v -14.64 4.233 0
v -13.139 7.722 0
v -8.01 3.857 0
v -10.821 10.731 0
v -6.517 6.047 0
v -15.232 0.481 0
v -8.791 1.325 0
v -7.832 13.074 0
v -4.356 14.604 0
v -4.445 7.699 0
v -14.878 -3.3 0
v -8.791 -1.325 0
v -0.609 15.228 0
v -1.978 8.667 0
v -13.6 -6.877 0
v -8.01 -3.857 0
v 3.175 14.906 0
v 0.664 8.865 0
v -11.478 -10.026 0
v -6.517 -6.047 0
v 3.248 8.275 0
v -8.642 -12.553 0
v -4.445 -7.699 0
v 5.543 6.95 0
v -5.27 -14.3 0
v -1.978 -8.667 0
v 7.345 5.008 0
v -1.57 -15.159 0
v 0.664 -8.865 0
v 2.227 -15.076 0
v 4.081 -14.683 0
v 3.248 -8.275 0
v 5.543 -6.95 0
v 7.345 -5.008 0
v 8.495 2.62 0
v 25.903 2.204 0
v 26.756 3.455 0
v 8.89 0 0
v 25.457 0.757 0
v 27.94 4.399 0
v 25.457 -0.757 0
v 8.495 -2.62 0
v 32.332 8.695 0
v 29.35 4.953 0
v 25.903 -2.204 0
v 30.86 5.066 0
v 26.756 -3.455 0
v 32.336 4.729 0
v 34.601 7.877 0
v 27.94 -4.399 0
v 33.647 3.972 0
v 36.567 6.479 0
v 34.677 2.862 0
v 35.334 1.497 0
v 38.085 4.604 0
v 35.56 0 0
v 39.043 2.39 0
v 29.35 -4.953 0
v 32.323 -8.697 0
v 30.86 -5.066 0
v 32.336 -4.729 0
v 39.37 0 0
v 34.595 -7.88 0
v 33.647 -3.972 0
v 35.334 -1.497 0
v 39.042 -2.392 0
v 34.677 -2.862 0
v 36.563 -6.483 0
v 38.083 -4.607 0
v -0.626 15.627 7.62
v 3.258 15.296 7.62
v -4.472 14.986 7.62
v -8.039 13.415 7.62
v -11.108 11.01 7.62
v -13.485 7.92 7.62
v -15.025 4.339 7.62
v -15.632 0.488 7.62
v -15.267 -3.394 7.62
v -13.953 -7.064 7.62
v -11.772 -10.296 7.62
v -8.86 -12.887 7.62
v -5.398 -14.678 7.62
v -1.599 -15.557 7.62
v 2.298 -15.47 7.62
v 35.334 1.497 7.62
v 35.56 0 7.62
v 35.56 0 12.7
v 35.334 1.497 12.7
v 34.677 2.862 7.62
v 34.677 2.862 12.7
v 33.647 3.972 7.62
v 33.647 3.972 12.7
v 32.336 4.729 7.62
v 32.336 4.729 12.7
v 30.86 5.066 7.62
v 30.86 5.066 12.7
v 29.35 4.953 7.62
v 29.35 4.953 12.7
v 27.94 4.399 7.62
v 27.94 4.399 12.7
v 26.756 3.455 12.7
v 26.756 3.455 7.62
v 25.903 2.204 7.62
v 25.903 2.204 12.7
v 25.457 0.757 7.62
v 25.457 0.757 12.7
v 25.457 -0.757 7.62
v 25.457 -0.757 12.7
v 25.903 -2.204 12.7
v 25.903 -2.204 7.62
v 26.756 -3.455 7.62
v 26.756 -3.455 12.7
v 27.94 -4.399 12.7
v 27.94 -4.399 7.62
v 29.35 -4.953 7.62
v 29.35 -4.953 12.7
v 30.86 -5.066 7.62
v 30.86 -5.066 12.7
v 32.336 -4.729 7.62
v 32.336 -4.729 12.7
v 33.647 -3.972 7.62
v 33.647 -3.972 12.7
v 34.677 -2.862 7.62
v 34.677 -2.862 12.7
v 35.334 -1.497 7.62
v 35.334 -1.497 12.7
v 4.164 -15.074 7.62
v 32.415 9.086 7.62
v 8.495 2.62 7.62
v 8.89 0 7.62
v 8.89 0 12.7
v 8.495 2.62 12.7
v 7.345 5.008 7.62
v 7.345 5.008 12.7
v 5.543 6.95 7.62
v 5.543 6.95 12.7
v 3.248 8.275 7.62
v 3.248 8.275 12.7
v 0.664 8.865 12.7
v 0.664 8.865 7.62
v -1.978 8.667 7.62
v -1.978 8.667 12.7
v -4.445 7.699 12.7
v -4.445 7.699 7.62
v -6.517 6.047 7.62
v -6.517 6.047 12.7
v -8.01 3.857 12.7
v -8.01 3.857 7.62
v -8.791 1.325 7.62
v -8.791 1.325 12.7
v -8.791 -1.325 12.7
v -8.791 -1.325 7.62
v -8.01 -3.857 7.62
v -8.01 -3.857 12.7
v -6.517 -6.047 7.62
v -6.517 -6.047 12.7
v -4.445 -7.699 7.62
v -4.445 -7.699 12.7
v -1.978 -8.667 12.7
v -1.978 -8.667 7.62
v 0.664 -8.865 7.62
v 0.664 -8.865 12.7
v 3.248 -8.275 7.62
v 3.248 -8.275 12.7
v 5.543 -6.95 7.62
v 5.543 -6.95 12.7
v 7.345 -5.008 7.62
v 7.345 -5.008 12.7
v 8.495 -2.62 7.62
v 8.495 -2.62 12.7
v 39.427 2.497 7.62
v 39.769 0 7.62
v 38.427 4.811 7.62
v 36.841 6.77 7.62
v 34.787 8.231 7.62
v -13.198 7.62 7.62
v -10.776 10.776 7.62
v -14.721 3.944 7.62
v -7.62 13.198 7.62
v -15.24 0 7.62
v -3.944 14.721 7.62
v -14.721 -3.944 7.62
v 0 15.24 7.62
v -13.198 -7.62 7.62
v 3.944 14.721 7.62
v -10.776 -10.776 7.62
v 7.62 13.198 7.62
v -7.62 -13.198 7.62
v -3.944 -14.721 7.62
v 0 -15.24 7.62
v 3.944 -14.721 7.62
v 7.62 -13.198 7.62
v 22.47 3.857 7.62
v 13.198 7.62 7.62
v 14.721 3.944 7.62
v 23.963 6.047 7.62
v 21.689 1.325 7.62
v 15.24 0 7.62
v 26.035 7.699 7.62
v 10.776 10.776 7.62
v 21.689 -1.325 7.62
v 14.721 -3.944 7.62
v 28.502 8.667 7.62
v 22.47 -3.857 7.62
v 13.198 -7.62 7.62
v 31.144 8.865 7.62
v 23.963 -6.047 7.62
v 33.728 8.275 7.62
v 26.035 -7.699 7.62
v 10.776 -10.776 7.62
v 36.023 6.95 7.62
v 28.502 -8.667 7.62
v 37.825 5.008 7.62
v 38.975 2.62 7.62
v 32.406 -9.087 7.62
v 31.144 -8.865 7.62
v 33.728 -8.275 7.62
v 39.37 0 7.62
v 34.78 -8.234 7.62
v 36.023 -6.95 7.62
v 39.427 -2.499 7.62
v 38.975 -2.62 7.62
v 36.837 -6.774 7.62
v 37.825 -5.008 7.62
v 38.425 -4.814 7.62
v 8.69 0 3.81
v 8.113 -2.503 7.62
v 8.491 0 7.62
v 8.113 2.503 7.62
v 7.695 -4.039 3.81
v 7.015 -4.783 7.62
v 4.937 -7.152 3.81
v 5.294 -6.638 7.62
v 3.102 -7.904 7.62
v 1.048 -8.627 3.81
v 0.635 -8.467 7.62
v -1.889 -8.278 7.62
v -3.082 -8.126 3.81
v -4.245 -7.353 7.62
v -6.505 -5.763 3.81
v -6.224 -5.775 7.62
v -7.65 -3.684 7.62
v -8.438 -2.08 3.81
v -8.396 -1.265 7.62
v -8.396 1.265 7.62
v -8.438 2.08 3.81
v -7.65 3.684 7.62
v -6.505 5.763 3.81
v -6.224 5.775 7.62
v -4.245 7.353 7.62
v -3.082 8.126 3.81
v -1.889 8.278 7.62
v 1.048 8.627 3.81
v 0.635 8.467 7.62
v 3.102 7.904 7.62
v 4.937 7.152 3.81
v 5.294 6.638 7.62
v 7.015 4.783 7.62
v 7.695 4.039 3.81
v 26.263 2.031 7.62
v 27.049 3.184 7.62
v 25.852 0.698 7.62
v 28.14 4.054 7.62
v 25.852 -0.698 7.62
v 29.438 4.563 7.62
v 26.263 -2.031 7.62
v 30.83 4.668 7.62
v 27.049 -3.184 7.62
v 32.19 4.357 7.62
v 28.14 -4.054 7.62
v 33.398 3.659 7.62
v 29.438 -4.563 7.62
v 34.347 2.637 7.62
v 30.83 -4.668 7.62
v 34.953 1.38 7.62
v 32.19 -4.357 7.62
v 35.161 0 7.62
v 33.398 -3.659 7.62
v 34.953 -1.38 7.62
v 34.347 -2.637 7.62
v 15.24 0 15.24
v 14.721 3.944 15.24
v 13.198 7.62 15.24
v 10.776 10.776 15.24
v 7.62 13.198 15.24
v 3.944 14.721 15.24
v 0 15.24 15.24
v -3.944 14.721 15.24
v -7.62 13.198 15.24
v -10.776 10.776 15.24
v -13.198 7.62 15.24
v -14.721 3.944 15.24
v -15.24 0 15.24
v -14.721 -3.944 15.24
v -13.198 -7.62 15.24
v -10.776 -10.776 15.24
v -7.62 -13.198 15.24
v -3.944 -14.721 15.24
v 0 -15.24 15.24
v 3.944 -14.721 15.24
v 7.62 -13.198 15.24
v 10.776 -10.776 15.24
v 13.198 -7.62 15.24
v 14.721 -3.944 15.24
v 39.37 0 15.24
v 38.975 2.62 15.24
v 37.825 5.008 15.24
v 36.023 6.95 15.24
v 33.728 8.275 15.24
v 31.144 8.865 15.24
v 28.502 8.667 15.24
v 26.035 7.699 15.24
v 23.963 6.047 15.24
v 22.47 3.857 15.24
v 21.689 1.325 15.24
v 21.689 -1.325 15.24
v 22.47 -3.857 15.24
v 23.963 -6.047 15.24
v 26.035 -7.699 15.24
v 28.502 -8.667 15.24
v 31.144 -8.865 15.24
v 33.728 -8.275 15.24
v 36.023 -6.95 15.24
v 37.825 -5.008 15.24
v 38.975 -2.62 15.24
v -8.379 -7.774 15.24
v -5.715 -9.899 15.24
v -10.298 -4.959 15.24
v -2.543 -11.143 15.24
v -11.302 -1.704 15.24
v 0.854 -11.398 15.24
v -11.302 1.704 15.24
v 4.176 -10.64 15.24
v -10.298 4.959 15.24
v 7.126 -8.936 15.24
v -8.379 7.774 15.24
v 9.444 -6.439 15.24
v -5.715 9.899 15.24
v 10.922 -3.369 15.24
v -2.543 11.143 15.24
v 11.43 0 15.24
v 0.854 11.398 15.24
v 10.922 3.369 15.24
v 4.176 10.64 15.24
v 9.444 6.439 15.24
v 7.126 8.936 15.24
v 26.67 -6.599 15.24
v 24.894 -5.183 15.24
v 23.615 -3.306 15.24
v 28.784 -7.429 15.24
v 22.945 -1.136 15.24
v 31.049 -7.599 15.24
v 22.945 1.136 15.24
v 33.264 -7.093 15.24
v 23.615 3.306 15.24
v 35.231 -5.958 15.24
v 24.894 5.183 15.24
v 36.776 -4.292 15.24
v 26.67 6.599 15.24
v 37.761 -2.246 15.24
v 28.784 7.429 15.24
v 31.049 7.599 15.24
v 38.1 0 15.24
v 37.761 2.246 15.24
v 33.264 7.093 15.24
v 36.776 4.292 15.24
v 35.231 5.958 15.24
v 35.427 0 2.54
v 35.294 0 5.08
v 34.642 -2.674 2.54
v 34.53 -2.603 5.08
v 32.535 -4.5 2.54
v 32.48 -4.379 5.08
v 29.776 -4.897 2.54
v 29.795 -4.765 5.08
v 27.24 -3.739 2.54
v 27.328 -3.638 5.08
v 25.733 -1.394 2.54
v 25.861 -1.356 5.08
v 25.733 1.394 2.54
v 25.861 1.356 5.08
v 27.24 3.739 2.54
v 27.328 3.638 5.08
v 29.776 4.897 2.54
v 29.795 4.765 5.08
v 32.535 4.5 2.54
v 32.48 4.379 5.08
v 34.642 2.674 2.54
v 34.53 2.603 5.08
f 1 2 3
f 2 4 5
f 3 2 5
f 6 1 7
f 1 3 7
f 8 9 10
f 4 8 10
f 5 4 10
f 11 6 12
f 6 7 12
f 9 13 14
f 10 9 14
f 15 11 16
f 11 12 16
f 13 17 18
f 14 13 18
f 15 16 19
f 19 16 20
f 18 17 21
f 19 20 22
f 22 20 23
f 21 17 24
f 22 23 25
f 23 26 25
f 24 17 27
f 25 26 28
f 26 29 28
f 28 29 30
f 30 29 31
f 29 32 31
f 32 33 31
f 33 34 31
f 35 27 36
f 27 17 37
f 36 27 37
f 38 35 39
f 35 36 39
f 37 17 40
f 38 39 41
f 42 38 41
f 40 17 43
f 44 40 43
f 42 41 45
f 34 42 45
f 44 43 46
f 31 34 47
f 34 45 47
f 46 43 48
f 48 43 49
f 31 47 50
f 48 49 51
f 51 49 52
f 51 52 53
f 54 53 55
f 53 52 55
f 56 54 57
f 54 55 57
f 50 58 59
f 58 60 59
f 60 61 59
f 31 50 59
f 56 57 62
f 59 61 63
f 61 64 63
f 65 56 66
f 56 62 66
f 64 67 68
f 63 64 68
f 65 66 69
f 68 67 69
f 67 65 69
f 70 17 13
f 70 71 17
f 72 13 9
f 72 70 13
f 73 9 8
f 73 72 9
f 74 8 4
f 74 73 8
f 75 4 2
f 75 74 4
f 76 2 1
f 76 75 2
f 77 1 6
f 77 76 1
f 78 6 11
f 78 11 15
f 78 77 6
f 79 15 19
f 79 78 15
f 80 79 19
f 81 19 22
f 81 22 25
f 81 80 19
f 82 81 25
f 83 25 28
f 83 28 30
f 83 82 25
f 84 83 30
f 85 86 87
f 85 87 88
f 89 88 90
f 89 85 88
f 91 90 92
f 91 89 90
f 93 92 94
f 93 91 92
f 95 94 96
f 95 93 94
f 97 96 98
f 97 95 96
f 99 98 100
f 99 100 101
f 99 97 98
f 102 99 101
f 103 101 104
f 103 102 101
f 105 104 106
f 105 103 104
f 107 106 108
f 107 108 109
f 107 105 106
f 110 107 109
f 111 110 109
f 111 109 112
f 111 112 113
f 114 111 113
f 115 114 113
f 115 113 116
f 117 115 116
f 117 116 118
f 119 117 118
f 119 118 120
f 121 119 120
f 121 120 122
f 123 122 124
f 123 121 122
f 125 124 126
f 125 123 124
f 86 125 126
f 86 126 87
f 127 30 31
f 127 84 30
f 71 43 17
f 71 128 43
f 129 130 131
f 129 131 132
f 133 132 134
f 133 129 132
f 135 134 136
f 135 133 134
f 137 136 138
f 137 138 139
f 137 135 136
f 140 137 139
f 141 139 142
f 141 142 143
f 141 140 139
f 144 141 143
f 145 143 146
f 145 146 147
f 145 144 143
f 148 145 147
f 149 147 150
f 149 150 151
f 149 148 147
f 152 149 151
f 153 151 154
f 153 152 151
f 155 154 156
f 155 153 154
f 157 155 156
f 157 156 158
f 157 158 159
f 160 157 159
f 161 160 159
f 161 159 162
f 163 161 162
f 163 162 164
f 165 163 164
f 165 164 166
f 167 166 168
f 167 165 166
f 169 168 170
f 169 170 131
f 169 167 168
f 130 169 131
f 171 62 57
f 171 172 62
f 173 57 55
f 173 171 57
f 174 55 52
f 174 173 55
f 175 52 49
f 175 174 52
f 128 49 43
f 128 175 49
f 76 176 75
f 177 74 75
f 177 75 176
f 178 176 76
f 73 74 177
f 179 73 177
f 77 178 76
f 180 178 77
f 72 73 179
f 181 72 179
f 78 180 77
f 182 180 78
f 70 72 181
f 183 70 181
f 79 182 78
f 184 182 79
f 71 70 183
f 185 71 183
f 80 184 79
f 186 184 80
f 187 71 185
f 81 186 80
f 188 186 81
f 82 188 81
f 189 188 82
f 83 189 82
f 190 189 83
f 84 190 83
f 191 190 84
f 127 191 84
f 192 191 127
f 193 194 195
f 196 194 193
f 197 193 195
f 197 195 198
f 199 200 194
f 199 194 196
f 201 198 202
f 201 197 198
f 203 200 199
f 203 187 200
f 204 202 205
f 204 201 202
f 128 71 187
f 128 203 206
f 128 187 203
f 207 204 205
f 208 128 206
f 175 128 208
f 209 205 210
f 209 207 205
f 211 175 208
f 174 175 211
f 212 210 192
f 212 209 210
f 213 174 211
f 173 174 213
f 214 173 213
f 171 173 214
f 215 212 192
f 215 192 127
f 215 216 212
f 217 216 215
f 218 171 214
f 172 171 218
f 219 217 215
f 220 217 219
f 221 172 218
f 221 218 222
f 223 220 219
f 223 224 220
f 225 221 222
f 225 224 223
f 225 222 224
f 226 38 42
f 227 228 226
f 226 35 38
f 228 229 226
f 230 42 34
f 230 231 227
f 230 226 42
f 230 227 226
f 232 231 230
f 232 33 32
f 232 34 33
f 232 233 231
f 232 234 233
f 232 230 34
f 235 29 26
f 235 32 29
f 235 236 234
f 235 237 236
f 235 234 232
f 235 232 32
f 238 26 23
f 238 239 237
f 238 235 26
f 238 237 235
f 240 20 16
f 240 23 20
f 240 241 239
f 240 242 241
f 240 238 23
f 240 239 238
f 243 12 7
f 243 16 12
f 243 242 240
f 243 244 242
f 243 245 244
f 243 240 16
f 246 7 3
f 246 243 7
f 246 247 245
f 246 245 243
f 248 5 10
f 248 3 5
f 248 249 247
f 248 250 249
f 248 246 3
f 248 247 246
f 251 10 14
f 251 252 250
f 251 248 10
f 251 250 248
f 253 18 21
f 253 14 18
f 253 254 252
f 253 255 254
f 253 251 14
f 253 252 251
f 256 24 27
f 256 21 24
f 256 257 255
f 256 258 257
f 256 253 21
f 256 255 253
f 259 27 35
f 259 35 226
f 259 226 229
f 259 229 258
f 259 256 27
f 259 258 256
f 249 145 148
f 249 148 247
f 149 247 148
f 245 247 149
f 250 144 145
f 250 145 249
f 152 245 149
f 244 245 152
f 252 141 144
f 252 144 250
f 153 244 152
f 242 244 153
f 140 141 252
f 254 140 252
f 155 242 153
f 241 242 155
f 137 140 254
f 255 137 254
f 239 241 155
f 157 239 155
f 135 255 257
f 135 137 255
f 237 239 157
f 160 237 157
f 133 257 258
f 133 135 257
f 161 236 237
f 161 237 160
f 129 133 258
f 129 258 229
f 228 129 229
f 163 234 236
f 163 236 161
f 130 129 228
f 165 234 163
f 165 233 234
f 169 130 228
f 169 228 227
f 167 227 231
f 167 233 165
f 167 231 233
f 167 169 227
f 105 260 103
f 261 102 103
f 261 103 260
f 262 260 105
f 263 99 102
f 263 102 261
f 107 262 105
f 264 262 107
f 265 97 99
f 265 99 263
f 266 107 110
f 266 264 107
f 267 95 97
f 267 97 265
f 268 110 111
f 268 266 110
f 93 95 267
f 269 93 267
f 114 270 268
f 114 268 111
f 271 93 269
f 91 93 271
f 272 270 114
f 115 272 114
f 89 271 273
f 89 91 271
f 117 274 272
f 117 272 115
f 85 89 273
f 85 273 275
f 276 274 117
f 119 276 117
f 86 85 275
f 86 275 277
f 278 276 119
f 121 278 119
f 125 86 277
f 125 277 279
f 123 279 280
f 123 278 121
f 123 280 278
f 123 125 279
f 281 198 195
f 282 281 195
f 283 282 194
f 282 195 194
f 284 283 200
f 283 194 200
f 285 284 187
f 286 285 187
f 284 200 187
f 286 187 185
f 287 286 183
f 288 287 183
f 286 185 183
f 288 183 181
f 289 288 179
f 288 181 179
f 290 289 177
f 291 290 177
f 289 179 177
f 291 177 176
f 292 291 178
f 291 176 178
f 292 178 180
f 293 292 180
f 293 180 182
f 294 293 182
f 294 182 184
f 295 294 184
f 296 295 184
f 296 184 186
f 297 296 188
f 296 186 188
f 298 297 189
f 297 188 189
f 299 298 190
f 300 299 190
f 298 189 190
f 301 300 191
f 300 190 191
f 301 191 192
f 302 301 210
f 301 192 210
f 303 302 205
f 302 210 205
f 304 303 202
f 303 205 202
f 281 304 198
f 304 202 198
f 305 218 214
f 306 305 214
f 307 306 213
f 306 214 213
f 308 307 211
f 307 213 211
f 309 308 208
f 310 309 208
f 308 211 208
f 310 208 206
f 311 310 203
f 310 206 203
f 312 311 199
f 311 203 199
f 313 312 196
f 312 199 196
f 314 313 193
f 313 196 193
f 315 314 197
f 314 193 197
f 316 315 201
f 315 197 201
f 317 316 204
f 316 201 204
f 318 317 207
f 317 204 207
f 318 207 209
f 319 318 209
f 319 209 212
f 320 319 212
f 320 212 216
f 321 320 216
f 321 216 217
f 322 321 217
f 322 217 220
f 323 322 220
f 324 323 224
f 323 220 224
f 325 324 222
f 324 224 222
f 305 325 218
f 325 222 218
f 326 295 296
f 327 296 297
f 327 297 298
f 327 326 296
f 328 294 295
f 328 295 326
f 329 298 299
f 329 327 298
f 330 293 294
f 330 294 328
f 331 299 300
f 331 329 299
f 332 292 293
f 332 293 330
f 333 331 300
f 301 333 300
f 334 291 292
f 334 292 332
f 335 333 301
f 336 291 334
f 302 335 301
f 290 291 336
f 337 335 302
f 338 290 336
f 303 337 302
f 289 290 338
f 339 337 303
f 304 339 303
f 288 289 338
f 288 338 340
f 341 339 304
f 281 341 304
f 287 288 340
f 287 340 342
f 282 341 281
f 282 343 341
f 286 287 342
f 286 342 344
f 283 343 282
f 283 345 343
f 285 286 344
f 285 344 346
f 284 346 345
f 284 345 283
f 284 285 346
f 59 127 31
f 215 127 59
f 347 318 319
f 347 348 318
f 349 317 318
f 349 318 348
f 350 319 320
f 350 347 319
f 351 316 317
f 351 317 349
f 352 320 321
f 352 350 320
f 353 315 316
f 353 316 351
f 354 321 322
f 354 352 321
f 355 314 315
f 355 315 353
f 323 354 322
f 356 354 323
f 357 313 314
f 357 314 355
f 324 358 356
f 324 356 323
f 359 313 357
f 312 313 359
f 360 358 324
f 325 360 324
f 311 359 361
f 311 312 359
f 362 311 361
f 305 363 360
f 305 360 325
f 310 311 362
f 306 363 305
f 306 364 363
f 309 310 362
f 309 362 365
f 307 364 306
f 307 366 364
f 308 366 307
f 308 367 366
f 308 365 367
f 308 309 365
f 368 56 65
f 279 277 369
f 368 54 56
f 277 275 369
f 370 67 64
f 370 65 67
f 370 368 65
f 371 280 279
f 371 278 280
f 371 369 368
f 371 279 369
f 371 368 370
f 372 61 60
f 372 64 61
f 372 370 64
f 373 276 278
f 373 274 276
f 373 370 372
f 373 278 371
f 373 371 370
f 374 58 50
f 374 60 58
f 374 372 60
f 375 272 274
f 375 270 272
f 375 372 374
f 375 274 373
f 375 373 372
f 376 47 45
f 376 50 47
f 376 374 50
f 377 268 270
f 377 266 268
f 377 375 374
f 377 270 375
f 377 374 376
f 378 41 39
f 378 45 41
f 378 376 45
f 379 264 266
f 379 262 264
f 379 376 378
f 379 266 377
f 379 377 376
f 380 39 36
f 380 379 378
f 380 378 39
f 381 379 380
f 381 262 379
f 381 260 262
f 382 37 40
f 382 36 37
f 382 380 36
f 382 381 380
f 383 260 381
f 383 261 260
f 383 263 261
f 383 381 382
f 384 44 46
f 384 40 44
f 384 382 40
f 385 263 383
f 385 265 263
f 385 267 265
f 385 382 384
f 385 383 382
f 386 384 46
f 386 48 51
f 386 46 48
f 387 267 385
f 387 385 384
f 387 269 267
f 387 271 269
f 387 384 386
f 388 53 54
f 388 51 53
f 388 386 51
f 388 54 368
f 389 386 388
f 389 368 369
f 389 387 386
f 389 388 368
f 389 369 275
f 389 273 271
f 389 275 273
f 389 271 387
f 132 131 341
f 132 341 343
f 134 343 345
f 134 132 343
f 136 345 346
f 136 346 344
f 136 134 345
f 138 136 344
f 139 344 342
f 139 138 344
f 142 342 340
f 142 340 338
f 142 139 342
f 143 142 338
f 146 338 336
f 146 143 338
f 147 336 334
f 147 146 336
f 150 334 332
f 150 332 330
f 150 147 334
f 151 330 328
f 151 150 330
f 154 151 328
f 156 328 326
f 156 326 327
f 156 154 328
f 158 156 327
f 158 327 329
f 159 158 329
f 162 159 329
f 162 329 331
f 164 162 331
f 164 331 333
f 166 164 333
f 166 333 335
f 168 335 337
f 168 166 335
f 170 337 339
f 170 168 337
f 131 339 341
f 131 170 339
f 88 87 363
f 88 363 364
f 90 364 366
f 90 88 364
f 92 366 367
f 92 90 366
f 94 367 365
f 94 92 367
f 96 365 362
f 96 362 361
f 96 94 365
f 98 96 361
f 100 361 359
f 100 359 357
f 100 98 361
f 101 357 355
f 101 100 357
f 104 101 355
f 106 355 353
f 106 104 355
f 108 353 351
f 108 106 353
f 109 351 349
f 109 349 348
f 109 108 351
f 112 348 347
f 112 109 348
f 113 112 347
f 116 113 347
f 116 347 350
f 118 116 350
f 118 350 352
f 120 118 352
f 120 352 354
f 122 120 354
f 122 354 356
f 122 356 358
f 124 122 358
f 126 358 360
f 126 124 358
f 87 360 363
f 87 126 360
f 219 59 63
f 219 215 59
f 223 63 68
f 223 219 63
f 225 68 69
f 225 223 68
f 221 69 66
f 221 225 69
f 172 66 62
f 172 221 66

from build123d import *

# Parameters (mm, degrees)
F0_R     = 8.89
F0_R_2   = 5.08
F1_DEPTH = 7.62
F1_TAPER = -3
F2_R     = 15.24
F2_R_2   = 8.89
F2_R_3   = 5.08
F3_DEPTH = 7.62
F4_SIZE  = 2.54


with BuildPart() as f1:
    # F0 (on Top) → F1 (new body)
    with BuildSketch(Plane.XY):
        with BuildLine():
            ThreePointArc((4.0809852702, -14.6834314526), (12.1336683554, -9.2212630502), (15.24, 0))
            ThreePointArc((15.24, 0), (11.8457713974, 9.5882897328), (3.175, 14.9056021348))
            ThreePointArc((3.175, 14.9056021348), (-15.2323925132, 0.4814751535), (2.2273110086, -15.0763618181))
            Line((2.2273110086, -15.0763618181), (4.0809852702, -14.6834314526))
        make_face()
        Circle(F0_R, mode=Mode.SUBTRACT)
        with BuildLine():
            ThreePointArc((39.37, 0), (37.3900333152, 5.5931690108), (32.3320833333, 8.6949345786))
            ThreePointArc((32.3320833333, 8.6949345786), (21.5900010863, 0.0043948805), (32.323485534, -8.6967615286))
            ThreePointArc((32.323485534, -8.6967615286), (37.3872674191, -5.5965843871), (39.37, 0))
        make_face()
        with Locations((30.48, 0)):
            Circle(F0_R_2, mode=Mode.SUBTRACT)
        with BuildLine():
            ThreePointArc((3.175, 14.9056021348), (11.8457713974, 9.5882897328), (15.24, 0))
            ThreePointArc((15.24, 0), (12.1336683554, -9.2212630502), (4.0809852702, -14.6834314526))
            Line((4.0809852702, -14.6834314526), (32.323485534, -8.6967615286))
            ThreePointArc((32.323485534, -8.6967615286), (21.5900010863, 0.0043948805), (32.3320833333, 8.6949345786))
            Line((32.3320833333, 8.6949345786), (3.175, 14.9056021348))
        make_face()
    extrude(amount=F1_DEPTH, taper=F1_TAPER)

    # F2 (on face) → F3 (join)
    with BuildSketch(Plane.XY.offset(7.62)):
        Circle(F2_R)
        Circle(F2_R_2, mode=Mode.SUBTRACT)
        with Locations((30.48, 0)):
            Circle(F2_R_2)
        with Locations((30.48, 0)):
            Circle(F2_R_3, mode=Mode.SUBTRACT)
    extrude(amount=F3_DEPTH)

    # F4
    f4_edges = [f1.edges().sort_by_distance(p)[0] for p in [
        (-8.89, 0, 15.24),
        (25.4, 0, 15.24),
    ]]
    chamfer(f4_edges, length=F4_SIZE)


solid = f1.part
